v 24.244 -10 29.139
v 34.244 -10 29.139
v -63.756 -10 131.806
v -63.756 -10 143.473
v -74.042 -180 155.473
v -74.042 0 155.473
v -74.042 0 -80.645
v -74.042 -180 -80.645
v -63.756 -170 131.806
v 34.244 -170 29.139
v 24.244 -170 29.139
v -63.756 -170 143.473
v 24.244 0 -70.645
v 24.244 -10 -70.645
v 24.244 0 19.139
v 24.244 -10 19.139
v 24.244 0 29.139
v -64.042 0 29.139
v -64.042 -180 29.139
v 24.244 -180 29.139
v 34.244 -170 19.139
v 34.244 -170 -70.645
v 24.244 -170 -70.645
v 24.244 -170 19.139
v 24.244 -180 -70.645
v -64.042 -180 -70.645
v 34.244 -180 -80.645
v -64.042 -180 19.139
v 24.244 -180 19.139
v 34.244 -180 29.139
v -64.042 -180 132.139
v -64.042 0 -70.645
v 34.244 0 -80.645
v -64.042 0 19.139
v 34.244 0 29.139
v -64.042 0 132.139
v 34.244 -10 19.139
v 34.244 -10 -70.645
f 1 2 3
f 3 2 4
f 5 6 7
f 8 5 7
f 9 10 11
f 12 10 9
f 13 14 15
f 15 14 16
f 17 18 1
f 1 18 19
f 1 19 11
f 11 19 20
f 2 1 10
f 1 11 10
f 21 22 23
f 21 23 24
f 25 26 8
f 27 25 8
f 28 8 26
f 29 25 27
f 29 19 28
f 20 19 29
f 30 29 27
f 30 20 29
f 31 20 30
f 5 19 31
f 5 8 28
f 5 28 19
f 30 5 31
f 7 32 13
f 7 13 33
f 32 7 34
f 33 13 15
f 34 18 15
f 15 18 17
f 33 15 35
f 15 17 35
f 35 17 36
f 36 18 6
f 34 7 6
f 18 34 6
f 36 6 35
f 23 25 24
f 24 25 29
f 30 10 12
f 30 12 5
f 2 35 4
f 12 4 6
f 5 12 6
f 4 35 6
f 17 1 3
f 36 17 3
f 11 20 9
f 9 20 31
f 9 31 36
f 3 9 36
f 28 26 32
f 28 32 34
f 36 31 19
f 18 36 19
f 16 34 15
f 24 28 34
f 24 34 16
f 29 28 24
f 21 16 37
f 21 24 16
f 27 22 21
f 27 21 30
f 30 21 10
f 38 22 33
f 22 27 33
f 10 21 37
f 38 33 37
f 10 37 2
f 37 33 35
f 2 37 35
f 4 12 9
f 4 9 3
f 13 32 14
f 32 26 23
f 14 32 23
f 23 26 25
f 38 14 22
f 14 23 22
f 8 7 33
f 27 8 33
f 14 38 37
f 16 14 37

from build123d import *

# Parameters (mm, degrees)
F1_DEPTH = 180
F2_W     = 88.2857142857
F2_H     = 89.7844721901
F3_DEPTH = 294
F4_W     = 160
F4_H     = 89.7844721901
F4_H_2   = 169.9516549903
F5_DEPTH = 98


with BuildPart() as f1:
    # F0 (on Front) → F1 (new body)
    with BuildSketch(Plane.XZ):
        Polygon((-74.0419839551, 155.4725316765), (-74.0419839551, 5.1880594864), (-74.0419839551, -80.6452738469), (34.2437303306, -80.6452738469), (34.2437303306, -59.6452738469), (34.2437303306, 29.1391983432), align=None)
    extrude(amount=F1_DEPTH)

    # F2 (on face) → F3 (cut)
    with BuildSketch(Plane.XZ.offset(180)):
        Polygon((-64.0419839551, 132.1391983432), (-64.0419839551, 29.1391983432), (24.2437303306, 29.1391983432), align=None)
        with Locations((-19.8991268123, -25.7530377519)):
            Rectangle(F2_W, F2_H)
    extrude(amount=-F3_DEPTH, mode=Mode.SUBTRACT)

    # F4 (on face) → F5 (cut)
    with BuildSketch(Plane.YZ.offset(34.2437303306)):
        with Locations((-90, -25.7530377519)):
            Rectangle(F4_W, F4_H)
        with Locations((-90, 114.1150258383)):
            Rectangle(F4_W, F4_H_2)
    extrude(amount=-F5_DEPTH, mode=Mode.SUBTRACT)


solid = f1.part
